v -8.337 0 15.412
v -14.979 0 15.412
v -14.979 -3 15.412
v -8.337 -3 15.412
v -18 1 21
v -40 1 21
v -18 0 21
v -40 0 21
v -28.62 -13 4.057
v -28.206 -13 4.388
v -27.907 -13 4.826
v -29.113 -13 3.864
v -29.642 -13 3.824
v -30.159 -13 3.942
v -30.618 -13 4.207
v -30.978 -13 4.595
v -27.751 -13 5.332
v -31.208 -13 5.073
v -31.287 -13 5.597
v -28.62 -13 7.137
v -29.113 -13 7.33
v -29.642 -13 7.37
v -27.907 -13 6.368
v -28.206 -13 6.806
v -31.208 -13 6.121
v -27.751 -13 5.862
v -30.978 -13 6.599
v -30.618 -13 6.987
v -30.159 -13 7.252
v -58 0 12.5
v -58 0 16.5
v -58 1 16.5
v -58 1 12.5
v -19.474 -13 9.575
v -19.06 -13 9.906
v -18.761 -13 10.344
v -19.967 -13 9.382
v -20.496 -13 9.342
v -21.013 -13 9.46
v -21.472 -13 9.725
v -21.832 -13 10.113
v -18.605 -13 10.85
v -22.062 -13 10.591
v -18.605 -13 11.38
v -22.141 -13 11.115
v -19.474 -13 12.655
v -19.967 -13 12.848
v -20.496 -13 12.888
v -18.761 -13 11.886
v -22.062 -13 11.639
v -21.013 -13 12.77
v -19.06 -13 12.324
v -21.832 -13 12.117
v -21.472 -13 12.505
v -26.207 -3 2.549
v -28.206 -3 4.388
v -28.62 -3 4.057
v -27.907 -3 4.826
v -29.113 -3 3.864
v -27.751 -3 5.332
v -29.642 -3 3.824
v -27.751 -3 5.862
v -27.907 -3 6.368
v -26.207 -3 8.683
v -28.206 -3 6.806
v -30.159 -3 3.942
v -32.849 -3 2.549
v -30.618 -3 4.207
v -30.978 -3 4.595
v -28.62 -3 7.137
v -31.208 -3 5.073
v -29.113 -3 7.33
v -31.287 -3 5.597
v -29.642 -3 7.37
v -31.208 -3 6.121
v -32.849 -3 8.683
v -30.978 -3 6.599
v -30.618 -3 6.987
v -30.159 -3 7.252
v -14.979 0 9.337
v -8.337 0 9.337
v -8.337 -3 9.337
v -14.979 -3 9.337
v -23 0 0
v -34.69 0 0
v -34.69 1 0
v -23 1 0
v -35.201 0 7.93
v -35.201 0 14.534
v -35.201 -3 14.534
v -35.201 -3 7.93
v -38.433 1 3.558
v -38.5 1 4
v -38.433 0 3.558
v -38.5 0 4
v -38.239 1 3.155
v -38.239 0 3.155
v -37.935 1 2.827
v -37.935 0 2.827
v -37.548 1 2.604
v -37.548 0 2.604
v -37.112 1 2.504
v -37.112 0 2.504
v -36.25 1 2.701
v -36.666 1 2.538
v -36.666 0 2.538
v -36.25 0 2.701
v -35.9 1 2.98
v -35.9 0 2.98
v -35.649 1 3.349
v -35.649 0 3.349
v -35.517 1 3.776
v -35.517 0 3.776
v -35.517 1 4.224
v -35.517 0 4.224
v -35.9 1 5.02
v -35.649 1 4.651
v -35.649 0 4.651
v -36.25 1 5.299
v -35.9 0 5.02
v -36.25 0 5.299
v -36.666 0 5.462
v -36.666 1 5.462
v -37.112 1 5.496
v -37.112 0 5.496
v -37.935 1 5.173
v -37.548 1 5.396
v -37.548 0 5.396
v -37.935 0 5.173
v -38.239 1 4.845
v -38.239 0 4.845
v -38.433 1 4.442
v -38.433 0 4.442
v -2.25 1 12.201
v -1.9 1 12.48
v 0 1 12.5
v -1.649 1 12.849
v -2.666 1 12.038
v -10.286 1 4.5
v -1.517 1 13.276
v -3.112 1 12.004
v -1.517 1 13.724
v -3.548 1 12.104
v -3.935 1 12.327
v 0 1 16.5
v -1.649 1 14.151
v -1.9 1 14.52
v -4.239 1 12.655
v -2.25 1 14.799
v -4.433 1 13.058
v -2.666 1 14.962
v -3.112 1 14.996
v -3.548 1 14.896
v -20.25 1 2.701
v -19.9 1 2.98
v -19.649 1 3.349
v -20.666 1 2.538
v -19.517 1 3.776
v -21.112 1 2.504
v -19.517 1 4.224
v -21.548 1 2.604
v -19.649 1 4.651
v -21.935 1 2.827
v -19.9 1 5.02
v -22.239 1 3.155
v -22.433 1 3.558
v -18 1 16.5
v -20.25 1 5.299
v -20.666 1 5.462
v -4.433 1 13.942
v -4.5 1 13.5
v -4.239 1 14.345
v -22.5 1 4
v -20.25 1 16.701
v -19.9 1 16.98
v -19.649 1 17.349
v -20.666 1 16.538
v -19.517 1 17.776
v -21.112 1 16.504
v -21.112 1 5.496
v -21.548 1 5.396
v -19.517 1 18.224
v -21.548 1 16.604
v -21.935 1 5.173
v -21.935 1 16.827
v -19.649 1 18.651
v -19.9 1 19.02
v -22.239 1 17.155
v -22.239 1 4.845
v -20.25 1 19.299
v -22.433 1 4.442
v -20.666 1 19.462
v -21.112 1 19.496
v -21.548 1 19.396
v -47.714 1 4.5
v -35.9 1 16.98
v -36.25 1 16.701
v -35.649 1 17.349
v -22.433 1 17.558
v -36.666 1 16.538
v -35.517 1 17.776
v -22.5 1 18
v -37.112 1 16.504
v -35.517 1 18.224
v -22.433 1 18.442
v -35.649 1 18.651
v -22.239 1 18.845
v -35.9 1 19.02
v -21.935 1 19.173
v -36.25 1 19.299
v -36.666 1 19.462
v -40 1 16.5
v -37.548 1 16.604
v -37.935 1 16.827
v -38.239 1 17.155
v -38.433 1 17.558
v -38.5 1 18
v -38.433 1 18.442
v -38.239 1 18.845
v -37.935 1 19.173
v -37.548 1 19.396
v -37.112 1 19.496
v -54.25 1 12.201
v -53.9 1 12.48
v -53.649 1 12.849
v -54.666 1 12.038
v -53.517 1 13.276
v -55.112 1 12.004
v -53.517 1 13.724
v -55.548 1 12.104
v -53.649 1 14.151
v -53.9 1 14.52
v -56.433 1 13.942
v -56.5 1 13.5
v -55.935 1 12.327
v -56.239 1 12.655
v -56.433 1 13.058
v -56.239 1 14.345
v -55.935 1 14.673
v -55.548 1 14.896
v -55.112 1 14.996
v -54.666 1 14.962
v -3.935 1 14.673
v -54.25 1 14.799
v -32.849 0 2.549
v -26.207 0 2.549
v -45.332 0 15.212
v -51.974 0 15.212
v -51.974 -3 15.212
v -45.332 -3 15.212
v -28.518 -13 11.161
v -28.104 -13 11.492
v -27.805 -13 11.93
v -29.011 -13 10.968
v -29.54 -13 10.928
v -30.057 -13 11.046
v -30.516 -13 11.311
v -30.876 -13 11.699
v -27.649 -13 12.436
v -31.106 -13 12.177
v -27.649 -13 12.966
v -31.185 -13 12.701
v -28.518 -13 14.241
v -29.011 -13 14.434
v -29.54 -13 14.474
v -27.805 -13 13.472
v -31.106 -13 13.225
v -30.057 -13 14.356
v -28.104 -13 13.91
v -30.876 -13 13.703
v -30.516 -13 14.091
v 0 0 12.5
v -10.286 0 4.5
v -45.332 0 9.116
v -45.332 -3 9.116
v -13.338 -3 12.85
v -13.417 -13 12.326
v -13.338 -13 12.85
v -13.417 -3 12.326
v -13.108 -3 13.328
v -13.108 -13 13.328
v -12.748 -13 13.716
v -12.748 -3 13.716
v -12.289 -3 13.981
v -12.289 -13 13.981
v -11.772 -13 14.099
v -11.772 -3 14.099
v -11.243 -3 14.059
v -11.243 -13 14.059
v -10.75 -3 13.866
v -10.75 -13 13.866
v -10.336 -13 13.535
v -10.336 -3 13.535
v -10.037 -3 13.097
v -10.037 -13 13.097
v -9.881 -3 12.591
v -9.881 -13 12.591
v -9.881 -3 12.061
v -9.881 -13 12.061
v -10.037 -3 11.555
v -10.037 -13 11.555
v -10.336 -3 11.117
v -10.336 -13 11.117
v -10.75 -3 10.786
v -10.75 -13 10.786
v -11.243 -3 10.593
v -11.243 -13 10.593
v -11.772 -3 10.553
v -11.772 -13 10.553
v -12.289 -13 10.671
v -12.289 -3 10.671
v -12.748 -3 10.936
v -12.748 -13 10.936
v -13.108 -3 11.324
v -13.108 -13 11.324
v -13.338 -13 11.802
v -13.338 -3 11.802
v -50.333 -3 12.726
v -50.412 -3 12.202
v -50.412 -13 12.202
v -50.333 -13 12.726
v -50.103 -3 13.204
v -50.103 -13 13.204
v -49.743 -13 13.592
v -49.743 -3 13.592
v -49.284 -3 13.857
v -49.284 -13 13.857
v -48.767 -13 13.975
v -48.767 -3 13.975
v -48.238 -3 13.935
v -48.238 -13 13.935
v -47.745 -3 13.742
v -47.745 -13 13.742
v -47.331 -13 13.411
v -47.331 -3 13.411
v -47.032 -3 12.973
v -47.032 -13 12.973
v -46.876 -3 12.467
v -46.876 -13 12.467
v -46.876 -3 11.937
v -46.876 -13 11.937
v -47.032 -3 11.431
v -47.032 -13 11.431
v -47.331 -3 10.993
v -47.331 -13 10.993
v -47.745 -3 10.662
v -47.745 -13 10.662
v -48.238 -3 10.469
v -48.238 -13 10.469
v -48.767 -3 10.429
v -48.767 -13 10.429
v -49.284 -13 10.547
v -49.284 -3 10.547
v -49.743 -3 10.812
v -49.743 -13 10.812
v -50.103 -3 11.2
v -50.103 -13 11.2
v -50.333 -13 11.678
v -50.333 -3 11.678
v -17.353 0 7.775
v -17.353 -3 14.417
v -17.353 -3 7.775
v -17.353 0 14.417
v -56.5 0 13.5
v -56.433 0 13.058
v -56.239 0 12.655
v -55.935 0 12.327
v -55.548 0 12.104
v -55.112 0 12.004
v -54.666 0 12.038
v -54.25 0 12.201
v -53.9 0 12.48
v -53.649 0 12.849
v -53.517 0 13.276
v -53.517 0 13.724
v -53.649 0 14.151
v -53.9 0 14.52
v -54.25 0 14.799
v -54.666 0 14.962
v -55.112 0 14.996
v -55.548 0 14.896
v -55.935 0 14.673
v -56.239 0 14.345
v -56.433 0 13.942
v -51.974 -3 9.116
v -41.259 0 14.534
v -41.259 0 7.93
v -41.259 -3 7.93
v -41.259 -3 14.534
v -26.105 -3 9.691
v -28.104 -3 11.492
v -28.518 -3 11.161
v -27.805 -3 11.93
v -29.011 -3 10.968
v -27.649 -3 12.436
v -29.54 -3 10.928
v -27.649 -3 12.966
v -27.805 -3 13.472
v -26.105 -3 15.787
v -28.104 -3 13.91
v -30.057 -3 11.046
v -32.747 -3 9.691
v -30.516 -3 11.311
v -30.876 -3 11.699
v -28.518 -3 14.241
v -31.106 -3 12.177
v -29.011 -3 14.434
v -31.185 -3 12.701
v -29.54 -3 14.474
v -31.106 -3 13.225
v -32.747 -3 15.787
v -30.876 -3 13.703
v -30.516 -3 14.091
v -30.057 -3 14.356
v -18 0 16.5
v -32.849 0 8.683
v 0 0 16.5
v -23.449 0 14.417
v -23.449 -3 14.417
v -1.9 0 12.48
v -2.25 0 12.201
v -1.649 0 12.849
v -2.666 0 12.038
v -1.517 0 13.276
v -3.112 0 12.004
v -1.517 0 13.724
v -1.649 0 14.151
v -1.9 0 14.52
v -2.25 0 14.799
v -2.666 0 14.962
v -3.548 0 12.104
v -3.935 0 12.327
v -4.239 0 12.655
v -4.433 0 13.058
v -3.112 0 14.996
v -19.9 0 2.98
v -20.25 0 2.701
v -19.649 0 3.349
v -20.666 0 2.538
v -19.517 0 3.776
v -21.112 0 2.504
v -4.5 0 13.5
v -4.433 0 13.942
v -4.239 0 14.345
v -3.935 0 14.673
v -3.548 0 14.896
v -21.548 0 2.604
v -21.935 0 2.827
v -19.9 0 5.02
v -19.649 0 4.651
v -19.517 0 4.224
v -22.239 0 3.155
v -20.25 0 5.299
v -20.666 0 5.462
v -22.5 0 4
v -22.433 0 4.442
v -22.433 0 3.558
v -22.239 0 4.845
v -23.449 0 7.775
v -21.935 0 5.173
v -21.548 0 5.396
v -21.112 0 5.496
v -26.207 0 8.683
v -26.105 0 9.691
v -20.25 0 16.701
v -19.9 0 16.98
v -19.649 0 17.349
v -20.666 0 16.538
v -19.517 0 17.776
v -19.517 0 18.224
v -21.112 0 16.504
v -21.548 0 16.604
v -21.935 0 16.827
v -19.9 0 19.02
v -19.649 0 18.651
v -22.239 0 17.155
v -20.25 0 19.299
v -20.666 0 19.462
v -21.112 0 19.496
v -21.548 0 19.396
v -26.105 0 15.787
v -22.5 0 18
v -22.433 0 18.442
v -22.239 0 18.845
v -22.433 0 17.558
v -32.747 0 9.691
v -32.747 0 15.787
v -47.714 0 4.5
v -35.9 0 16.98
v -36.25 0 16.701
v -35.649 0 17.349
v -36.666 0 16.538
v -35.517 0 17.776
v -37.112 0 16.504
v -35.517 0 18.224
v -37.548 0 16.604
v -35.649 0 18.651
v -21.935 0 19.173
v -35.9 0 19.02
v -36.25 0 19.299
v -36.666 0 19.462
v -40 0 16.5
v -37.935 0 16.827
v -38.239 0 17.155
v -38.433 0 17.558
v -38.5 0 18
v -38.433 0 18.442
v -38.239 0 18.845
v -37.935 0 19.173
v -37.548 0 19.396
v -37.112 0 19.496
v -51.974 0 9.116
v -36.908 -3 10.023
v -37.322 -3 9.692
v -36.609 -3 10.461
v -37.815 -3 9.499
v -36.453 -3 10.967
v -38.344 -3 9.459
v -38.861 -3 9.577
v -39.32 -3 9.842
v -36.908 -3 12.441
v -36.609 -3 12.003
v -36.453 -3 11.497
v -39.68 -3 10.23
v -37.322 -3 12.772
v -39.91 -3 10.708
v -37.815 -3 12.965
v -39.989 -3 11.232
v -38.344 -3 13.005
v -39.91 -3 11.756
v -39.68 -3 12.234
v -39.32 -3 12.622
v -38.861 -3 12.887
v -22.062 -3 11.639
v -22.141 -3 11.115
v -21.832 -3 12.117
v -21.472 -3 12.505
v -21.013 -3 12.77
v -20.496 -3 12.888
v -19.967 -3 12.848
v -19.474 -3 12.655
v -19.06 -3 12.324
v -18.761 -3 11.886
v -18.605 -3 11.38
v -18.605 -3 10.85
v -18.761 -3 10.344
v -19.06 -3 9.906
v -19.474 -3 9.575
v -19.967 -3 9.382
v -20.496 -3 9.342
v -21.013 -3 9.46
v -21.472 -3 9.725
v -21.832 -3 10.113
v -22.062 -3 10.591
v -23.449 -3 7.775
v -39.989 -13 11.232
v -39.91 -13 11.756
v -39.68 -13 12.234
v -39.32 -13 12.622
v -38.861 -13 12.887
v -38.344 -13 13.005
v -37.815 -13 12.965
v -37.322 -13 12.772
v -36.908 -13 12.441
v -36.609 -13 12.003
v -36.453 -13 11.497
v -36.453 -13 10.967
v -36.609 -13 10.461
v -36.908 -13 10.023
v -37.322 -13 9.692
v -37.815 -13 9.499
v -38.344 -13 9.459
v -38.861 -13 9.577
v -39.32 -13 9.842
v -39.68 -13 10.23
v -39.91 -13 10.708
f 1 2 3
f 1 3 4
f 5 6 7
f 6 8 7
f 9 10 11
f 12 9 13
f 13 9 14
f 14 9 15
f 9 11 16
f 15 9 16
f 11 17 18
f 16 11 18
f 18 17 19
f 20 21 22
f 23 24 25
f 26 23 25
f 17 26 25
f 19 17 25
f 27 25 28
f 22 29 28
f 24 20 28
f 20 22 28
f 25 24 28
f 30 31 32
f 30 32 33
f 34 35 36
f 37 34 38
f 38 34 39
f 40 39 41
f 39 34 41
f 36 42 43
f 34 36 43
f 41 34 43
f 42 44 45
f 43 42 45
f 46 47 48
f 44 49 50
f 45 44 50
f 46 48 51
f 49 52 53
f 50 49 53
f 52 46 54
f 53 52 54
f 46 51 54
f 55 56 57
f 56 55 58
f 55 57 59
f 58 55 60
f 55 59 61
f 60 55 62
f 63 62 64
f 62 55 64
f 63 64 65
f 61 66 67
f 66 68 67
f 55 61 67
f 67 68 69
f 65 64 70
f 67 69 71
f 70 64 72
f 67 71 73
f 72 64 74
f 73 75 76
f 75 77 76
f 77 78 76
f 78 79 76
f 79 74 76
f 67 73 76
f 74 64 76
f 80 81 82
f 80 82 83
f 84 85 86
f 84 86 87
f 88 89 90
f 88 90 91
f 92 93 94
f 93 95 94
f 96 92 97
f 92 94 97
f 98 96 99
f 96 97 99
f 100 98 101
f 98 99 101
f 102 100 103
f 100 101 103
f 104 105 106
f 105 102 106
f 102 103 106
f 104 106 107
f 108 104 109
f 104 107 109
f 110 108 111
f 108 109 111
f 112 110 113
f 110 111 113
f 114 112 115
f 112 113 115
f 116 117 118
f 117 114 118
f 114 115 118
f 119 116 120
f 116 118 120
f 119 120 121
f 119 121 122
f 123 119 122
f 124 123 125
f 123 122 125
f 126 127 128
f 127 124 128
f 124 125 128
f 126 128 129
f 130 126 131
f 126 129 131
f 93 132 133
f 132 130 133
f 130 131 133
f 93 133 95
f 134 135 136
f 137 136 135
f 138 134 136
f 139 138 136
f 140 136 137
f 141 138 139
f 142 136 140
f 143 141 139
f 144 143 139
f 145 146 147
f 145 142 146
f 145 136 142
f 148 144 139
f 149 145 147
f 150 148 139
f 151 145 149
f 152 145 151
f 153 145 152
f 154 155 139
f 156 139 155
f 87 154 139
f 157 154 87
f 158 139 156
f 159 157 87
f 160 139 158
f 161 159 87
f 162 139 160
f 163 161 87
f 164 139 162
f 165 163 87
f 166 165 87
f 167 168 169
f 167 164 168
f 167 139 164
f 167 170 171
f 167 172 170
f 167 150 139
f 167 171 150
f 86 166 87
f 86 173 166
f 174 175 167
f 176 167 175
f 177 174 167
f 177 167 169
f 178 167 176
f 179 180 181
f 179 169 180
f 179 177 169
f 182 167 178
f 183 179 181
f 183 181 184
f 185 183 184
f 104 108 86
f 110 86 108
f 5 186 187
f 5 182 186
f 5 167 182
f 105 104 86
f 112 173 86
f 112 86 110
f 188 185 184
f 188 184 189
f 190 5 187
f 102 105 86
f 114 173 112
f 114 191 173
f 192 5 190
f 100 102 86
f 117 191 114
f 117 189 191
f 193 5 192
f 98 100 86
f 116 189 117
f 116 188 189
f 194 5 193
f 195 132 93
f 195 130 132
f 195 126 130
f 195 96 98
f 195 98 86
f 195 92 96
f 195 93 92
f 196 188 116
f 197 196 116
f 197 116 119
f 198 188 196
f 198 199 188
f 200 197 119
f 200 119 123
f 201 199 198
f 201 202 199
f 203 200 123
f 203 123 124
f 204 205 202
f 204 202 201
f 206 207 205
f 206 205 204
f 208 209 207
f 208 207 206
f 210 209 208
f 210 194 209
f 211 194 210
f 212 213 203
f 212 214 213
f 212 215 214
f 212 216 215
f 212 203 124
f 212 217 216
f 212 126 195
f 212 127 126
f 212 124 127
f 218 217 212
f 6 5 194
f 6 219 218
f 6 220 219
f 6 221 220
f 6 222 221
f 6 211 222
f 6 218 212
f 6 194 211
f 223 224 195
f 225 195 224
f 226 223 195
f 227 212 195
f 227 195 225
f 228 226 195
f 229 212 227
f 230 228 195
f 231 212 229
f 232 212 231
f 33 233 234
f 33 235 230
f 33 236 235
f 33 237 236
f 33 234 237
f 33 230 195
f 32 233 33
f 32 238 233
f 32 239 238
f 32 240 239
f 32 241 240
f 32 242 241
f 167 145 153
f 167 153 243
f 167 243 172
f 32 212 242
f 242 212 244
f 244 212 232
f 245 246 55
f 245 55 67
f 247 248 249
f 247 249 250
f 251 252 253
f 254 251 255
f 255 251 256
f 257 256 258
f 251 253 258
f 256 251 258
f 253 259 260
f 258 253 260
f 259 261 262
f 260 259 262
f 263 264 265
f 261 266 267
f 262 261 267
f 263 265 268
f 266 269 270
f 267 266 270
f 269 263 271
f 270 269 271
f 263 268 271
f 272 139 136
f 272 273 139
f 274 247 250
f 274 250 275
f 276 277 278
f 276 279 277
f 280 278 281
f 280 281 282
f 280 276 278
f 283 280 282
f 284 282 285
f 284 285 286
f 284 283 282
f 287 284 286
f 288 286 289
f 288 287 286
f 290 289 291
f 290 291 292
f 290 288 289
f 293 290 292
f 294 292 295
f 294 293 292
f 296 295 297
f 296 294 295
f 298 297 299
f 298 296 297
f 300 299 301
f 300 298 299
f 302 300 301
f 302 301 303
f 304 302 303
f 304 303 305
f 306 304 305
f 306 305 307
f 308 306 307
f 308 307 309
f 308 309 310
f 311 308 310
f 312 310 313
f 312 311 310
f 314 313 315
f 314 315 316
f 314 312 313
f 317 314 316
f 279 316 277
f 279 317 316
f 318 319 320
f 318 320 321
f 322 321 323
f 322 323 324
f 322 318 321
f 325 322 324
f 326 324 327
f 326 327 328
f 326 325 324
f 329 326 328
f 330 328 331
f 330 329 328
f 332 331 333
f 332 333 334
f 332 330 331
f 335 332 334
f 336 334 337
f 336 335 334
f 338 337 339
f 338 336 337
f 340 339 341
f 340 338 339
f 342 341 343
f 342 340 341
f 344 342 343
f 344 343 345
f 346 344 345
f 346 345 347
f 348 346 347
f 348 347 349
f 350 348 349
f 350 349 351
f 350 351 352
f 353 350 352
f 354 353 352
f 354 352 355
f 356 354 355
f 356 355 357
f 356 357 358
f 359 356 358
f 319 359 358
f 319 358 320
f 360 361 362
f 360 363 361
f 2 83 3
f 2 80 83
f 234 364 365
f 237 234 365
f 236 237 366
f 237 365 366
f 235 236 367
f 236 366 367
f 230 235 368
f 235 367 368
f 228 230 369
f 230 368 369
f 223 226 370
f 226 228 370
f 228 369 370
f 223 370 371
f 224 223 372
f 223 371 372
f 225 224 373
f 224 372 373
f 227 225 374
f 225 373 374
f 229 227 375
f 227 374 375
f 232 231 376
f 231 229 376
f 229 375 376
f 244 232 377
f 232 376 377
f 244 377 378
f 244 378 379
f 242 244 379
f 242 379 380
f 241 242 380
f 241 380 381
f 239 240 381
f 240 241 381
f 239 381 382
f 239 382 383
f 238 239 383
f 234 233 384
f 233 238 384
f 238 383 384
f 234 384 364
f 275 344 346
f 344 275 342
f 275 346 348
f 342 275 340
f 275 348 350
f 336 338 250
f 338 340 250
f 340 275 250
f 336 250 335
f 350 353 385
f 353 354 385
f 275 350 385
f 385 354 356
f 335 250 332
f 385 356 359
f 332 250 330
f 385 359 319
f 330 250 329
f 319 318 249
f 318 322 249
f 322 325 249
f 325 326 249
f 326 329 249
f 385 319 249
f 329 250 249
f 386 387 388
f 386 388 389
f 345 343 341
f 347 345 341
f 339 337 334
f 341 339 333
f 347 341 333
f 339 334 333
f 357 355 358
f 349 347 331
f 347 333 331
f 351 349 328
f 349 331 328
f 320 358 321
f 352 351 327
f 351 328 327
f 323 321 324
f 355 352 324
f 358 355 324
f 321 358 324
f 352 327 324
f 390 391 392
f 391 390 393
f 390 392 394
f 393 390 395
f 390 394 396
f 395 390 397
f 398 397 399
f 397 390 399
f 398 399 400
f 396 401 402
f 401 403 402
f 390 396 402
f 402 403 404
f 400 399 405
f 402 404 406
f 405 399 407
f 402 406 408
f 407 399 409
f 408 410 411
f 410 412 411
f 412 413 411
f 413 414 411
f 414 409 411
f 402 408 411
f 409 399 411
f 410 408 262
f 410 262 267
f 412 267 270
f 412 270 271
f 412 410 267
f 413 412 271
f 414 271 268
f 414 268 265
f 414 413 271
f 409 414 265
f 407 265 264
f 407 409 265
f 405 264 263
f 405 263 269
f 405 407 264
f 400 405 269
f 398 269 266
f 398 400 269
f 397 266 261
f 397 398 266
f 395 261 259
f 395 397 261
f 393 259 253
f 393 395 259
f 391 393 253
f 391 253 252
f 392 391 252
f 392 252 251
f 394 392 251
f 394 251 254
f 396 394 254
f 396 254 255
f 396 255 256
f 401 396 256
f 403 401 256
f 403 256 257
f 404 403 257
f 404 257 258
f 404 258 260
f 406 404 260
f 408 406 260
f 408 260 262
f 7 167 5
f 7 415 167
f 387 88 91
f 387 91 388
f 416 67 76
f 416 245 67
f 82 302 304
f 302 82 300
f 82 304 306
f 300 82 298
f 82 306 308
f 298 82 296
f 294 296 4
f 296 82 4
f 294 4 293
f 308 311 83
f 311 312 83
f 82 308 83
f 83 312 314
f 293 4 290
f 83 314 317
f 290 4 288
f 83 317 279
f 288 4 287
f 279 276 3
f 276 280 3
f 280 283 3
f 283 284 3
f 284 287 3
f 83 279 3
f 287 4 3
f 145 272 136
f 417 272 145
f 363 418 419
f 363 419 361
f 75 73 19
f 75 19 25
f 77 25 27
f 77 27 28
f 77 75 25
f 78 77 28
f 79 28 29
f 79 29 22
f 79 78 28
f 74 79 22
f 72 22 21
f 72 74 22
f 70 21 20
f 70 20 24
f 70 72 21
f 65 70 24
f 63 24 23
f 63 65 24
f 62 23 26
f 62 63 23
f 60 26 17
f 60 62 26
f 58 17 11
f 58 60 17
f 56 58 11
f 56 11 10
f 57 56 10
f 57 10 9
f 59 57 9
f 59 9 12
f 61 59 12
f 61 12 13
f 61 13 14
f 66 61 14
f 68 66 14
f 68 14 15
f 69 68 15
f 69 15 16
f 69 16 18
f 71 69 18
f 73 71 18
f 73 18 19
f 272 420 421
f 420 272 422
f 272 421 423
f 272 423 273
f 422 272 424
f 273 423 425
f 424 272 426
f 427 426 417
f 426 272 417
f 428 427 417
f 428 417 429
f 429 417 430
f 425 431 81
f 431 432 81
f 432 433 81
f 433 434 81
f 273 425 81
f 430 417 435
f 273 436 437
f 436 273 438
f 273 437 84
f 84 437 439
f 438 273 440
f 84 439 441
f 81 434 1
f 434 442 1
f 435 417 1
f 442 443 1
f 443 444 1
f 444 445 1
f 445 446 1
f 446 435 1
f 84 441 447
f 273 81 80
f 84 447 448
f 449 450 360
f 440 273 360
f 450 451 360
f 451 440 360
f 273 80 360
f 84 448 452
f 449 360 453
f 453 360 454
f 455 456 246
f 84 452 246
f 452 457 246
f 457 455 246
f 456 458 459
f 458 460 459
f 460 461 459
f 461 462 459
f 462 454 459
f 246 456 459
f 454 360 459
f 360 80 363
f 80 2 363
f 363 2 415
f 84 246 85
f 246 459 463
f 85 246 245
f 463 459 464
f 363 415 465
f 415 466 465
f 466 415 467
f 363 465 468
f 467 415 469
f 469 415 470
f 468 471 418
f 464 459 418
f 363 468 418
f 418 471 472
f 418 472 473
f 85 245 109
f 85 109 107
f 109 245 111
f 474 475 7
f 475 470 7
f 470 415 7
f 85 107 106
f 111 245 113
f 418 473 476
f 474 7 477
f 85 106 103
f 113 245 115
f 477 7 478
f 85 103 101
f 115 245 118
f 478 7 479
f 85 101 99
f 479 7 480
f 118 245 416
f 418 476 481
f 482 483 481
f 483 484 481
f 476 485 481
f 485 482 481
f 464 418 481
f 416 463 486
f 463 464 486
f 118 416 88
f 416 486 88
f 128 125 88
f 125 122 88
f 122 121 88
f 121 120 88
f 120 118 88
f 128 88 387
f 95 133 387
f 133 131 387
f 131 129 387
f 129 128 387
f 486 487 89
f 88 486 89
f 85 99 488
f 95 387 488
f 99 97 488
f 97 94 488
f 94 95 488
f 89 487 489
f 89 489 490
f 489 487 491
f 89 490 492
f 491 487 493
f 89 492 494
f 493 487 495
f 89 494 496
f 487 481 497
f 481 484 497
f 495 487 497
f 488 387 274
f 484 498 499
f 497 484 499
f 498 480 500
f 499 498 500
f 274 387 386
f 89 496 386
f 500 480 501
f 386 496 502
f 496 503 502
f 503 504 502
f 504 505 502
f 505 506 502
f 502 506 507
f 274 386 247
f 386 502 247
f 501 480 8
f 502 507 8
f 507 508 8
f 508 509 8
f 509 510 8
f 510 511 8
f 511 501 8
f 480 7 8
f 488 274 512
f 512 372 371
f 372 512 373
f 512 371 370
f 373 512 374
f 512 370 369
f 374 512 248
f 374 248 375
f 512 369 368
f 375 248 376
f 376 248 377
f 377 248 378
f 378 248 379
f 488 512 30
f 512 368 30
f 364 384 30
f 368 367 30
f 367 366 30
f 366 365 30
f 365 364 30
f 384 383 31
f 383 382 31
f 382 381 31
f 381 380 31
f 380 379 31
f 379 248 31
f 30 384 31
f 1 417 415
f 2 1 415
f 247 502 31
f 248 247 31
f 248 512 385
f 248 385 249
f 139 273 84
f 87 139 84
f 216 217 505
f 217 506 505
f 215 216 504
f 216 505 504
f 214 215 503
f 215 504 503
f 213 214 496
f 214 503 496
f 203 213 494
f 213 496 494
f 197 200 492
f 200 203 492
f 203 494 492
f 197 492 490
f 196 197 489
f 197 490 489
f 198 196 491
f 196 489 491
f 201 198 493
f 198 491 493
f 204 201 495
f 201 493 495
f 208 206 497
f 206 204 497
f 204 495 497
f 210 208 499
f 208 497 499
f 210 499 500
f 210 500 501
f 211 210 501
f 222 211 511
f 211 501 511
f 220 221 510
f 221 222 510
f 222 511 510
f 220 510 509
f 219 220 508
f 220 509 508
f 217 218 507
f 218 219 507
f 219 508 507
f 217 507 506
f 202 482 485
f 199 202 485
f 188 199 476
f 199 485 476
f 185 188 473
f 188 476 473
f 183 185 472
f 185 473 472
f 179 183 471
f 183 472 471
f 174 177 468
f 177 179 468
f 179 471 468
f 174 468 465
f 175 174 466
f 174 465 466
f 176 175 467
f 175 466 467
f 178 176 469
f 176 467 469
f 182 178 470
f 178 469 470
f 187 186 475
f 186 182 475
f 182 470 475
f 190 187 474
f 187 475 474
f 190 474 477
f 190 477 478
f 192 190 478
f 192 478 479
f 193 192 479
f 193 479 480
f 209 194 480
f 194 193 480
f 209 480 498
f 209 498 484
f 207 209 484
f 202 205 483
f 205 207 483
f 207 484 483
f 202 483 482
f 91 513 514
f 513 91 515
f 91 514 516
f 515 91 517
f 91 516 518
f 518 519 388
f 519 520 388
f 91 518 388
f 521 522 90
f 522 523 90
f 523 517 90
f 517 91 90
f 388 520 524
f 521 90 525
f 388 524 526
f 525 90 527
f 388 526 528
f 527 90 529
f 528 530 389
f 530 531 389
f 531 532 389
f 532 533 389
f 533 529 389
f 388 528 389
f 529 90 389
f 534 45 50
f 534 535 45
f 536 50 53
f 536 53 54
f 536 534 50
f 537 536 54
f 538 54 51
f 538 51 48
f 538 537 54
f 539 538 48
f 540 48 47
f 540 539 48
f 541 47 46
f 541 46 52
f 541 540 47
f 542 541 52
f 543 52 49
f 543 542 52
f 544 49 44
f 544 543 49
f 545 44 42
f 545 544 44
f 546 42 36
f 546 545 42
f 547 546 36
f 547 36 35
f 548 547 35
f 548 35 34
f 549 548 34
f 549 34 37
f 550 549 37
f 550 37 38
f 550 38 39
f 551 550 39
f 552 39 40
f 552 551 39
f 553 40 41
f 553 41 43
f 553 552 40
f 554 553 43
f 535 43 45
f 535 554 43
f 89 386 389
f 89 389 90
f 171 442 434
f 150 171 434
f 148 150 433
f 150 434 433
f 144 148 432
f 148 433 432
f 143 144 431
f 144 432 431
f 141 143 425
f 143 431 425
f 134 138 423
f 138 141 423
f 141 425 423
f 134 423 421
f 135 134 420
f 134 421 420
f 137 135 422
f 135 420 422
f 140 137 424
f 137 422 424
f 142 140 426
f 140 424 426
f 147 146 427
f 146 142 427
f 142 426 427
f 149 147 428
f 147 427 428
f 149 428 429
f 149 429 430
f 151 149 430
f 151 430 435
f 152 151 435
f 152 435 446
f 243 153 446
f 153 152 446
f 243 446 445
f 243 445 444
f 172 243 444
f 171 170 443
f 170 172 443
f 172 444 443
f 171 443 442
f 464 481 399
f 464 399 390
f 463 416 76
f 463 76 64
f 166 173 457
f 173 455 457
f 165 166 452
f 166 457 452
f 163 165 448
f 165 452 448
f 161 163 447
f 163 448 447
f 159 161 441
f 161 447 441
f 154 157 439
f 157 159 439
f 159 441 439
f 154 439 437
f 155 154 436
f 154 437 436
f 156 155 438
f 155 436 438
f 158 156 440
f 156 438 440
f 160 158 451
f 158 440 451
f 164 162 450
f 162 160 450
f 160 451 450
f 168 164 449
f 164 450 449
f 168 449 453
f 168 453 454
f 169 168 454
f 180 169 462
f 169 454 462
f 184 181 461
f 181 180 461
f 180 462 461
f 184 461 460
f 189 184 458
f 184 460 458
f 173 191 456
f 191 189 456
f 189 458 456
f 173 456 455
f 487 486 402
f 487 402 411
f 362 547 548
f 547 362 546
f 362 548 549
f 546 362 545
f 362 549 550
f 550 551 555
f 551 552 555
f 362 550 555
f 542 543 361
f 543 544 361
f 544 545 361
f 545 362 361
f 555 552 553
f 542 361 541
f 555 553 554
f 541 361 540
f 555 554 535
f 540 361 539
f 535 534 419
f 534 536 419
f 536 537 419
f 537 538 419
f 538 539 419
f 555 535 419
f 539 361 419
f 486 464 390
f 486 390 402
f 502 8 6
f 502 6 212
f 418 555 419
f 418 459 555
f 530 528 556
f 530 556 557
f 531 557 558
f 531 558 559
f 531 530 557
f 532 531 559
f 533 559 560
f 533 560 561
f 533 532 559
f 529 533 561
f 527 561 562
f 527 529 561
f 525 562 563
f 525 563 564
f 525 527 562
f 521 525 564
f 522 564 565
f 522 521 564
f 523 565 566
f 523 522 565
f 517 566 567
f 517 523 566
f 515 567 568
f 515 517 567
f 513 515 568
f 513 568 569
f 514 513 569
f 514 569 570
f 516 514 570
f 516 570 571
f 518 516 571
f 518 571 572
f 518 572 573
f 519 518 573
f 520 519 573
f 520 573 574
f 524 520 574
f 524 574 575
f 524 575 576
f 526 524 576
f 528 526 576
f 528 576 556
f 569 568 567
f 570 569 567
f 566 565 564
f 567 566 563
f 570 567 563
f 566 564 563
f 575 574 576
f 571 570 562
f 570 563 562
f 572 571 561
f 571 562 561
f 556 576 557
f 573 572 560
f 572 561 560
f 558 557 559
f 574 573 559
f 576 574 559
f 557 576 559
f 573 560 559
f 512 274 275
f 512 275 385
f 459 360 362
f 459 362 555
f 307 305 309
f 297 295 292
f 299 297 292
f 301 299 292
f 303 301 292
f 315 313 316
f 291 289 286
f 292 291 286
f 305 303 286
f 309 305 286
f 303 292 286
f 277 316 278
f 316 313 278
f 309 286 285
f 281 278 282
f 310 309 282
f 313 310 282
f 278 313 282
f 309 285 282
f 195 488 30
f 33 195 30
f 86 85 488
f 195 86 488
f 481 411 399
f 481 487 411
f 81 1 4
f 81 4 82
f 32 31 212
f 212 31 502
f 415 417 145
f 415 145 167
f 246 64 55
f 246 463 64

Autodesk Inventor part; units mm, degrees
ref_plane "YZ Plane" through (0, 0, 0) normal (1, 0, 0) x (0, 1, 0)
ref_plane "XZ Plane" through (0, 0, 0) normal (0, 1, 0) x (-1, 0, 0)
ref_plane "XY Plane" through (0, 0, 0) normal (0, 0, 1) x (1, 0, 0)
sketch "Sketch1" plane through (0, 0, 0) normal (0, 1, 0) x (-1, 0, 0)
  circle A0 centre (48.634, 12.202) radius 1.778
  circle A1 centre (29.509, 5.597) radius 1.778
  circle A2 centre (37, 18) radius 1.5
  circle A3 centre (21, 18) radius 1.5
  circle A4 centre (3, 13.5) radius 1.5
  circle A5 centre (21, 4) radius 1.5
  circle A6 centre (37, 4) radius 1.5
  circle A7 centre (55, 13.5) radius 1.5
  circle A8 centre (11.639, 12.326) radius 1.778
  circle A9 centre (20.363, 11.115) radius 1.778
  circle A10 centre (29.407, 12.701) radius 1.778
  circle A11 centre (38.211, 11.232) radius 1.778
  line L0 (10.2856, 4.4998) -> (-0.0002, 12.5003)
  line L1 (34.6899, 0.0005) -> (47.7142, 4.5002)
  line L2 (57.9997, 16.5) -> (40.0003, 16.5)
  line L3 (39.9997, 21) -> (17.9997, 21)
  line L4 (-0.0003, 16.5) -> (18.0003, 16.5)
  line L5 (10.2856, 4.4998) -> (23.0001, 0.0002)
  line L6 (47.7142, 4.5002) -> (57.9998, 12.5002)
  line L7 (57.9997, 16.5) -> (57.9998, 12.5002)
  line L8 (34.6899, 0.0005) -> (23.0001, 0.0002)
  line L9 (-0.0002, 12.5003) -> (-0.0003, 16.5)
  line L10 (18.0003, 16.5) -> (17.9997, 21)
  line L11 (39.9997, 21) -> (40.0003, 16.5)
  line L12 (51.9741, 15.2119) -> (45.332, 15.2119)
  line L13 (45.332, 15.2119) -> (45.332, 9.1159)
  line L14 (45.332, 9.1159) -> (51.9741, 9.1159)
  line L15 (51.9741, 9.1159) -> (51.9741, 15.2119)
  line L16 (41.259, 14.534) -> (35.2011, 14.534)
  line L17 (35.2011, 14.534) -> (35.2011, 7.93)
  line L18 (35.2011, 7.93) -> (41.259, 7.93)
  line L19 (41.259, 7.93) -> (41.259, 14.534)
  line L20 (32.7471, 15.7871) -> (26.105, 15.7871)
  line L21 (26.105, 15.7871) -> (26.105, 9.6911)
  line L22 (26.105, 9.6911) -> (32.7471, 9.6911)
  line L23 (32.7471, 9.6911) -> (32.7471, 15.7871)
  line L24 (32.8491, 8.6831) -> (26.207, 8.6831)
  line L25 (26.207, 8.6831) -> (26.207, 2.549)
  line L26 (26.207, 2.549) -> (32.8491, 2.549)
  line L27 (32.8491, 2.549) -> (32.8491, 8.6831)
  line L28 (23.4491, 14.417) -> (17.3531, 14.417)
  line L29 (17.3531, 14.417) -> (17.3531, 7.7749)
  line L30 (17.3531, 7.7749) -> (23.4491, 7.7749)
  line L31 (23.4491, 7.7749) -> (23.4491, 14.417)
  line L32 (14.9791, 15.4121) -> (8.337, 15.4121)
  line L33 (8.337, 15.4121) -> (8.337, 9.337)
  line L34 (8.337, 9.337) -> (14.9791, 9.337)
  line L35 (14.9791, 9.337) -> (14.9791, 15.4121)
  point P0 (0, 0)
extrude "Extrusion1" add sketch "Sketch1" along normal blind 1 contours A0 | A1 | A8 | A9 | A10 | A11 | L0 L9 L4 L10 L3 L11 L2 L7 L6 L1 L8 L5 | L15 L14 L13 L12 | L19 L18 L17 L16 | L23 L22 L21 L20 | L27 L26 L25 L24 | L31 L30 L29 L28 | L35 L34 L33 L32
extrude "Extrusion2" add sketch "Sketch1" against normal blind 3 contours L15 L14 L13 L12 | L19 L18 L17 L16 | L23 L22 L21 L20 | L27 L26 L25 L24 | L31 L30 L29 L28 | L35 L34 L33 L32
extrude "Extrusion3" add sketch "Sketch1" against normal blind 13 contours A0 | A1 | A8 | A9 | A10 | A11
ref_plane "Work Plane1" through (-28.9998, 0, 12.501) normal (1, 0, 0) x (0, 0, -1)
properties part number "Keyboard1"
